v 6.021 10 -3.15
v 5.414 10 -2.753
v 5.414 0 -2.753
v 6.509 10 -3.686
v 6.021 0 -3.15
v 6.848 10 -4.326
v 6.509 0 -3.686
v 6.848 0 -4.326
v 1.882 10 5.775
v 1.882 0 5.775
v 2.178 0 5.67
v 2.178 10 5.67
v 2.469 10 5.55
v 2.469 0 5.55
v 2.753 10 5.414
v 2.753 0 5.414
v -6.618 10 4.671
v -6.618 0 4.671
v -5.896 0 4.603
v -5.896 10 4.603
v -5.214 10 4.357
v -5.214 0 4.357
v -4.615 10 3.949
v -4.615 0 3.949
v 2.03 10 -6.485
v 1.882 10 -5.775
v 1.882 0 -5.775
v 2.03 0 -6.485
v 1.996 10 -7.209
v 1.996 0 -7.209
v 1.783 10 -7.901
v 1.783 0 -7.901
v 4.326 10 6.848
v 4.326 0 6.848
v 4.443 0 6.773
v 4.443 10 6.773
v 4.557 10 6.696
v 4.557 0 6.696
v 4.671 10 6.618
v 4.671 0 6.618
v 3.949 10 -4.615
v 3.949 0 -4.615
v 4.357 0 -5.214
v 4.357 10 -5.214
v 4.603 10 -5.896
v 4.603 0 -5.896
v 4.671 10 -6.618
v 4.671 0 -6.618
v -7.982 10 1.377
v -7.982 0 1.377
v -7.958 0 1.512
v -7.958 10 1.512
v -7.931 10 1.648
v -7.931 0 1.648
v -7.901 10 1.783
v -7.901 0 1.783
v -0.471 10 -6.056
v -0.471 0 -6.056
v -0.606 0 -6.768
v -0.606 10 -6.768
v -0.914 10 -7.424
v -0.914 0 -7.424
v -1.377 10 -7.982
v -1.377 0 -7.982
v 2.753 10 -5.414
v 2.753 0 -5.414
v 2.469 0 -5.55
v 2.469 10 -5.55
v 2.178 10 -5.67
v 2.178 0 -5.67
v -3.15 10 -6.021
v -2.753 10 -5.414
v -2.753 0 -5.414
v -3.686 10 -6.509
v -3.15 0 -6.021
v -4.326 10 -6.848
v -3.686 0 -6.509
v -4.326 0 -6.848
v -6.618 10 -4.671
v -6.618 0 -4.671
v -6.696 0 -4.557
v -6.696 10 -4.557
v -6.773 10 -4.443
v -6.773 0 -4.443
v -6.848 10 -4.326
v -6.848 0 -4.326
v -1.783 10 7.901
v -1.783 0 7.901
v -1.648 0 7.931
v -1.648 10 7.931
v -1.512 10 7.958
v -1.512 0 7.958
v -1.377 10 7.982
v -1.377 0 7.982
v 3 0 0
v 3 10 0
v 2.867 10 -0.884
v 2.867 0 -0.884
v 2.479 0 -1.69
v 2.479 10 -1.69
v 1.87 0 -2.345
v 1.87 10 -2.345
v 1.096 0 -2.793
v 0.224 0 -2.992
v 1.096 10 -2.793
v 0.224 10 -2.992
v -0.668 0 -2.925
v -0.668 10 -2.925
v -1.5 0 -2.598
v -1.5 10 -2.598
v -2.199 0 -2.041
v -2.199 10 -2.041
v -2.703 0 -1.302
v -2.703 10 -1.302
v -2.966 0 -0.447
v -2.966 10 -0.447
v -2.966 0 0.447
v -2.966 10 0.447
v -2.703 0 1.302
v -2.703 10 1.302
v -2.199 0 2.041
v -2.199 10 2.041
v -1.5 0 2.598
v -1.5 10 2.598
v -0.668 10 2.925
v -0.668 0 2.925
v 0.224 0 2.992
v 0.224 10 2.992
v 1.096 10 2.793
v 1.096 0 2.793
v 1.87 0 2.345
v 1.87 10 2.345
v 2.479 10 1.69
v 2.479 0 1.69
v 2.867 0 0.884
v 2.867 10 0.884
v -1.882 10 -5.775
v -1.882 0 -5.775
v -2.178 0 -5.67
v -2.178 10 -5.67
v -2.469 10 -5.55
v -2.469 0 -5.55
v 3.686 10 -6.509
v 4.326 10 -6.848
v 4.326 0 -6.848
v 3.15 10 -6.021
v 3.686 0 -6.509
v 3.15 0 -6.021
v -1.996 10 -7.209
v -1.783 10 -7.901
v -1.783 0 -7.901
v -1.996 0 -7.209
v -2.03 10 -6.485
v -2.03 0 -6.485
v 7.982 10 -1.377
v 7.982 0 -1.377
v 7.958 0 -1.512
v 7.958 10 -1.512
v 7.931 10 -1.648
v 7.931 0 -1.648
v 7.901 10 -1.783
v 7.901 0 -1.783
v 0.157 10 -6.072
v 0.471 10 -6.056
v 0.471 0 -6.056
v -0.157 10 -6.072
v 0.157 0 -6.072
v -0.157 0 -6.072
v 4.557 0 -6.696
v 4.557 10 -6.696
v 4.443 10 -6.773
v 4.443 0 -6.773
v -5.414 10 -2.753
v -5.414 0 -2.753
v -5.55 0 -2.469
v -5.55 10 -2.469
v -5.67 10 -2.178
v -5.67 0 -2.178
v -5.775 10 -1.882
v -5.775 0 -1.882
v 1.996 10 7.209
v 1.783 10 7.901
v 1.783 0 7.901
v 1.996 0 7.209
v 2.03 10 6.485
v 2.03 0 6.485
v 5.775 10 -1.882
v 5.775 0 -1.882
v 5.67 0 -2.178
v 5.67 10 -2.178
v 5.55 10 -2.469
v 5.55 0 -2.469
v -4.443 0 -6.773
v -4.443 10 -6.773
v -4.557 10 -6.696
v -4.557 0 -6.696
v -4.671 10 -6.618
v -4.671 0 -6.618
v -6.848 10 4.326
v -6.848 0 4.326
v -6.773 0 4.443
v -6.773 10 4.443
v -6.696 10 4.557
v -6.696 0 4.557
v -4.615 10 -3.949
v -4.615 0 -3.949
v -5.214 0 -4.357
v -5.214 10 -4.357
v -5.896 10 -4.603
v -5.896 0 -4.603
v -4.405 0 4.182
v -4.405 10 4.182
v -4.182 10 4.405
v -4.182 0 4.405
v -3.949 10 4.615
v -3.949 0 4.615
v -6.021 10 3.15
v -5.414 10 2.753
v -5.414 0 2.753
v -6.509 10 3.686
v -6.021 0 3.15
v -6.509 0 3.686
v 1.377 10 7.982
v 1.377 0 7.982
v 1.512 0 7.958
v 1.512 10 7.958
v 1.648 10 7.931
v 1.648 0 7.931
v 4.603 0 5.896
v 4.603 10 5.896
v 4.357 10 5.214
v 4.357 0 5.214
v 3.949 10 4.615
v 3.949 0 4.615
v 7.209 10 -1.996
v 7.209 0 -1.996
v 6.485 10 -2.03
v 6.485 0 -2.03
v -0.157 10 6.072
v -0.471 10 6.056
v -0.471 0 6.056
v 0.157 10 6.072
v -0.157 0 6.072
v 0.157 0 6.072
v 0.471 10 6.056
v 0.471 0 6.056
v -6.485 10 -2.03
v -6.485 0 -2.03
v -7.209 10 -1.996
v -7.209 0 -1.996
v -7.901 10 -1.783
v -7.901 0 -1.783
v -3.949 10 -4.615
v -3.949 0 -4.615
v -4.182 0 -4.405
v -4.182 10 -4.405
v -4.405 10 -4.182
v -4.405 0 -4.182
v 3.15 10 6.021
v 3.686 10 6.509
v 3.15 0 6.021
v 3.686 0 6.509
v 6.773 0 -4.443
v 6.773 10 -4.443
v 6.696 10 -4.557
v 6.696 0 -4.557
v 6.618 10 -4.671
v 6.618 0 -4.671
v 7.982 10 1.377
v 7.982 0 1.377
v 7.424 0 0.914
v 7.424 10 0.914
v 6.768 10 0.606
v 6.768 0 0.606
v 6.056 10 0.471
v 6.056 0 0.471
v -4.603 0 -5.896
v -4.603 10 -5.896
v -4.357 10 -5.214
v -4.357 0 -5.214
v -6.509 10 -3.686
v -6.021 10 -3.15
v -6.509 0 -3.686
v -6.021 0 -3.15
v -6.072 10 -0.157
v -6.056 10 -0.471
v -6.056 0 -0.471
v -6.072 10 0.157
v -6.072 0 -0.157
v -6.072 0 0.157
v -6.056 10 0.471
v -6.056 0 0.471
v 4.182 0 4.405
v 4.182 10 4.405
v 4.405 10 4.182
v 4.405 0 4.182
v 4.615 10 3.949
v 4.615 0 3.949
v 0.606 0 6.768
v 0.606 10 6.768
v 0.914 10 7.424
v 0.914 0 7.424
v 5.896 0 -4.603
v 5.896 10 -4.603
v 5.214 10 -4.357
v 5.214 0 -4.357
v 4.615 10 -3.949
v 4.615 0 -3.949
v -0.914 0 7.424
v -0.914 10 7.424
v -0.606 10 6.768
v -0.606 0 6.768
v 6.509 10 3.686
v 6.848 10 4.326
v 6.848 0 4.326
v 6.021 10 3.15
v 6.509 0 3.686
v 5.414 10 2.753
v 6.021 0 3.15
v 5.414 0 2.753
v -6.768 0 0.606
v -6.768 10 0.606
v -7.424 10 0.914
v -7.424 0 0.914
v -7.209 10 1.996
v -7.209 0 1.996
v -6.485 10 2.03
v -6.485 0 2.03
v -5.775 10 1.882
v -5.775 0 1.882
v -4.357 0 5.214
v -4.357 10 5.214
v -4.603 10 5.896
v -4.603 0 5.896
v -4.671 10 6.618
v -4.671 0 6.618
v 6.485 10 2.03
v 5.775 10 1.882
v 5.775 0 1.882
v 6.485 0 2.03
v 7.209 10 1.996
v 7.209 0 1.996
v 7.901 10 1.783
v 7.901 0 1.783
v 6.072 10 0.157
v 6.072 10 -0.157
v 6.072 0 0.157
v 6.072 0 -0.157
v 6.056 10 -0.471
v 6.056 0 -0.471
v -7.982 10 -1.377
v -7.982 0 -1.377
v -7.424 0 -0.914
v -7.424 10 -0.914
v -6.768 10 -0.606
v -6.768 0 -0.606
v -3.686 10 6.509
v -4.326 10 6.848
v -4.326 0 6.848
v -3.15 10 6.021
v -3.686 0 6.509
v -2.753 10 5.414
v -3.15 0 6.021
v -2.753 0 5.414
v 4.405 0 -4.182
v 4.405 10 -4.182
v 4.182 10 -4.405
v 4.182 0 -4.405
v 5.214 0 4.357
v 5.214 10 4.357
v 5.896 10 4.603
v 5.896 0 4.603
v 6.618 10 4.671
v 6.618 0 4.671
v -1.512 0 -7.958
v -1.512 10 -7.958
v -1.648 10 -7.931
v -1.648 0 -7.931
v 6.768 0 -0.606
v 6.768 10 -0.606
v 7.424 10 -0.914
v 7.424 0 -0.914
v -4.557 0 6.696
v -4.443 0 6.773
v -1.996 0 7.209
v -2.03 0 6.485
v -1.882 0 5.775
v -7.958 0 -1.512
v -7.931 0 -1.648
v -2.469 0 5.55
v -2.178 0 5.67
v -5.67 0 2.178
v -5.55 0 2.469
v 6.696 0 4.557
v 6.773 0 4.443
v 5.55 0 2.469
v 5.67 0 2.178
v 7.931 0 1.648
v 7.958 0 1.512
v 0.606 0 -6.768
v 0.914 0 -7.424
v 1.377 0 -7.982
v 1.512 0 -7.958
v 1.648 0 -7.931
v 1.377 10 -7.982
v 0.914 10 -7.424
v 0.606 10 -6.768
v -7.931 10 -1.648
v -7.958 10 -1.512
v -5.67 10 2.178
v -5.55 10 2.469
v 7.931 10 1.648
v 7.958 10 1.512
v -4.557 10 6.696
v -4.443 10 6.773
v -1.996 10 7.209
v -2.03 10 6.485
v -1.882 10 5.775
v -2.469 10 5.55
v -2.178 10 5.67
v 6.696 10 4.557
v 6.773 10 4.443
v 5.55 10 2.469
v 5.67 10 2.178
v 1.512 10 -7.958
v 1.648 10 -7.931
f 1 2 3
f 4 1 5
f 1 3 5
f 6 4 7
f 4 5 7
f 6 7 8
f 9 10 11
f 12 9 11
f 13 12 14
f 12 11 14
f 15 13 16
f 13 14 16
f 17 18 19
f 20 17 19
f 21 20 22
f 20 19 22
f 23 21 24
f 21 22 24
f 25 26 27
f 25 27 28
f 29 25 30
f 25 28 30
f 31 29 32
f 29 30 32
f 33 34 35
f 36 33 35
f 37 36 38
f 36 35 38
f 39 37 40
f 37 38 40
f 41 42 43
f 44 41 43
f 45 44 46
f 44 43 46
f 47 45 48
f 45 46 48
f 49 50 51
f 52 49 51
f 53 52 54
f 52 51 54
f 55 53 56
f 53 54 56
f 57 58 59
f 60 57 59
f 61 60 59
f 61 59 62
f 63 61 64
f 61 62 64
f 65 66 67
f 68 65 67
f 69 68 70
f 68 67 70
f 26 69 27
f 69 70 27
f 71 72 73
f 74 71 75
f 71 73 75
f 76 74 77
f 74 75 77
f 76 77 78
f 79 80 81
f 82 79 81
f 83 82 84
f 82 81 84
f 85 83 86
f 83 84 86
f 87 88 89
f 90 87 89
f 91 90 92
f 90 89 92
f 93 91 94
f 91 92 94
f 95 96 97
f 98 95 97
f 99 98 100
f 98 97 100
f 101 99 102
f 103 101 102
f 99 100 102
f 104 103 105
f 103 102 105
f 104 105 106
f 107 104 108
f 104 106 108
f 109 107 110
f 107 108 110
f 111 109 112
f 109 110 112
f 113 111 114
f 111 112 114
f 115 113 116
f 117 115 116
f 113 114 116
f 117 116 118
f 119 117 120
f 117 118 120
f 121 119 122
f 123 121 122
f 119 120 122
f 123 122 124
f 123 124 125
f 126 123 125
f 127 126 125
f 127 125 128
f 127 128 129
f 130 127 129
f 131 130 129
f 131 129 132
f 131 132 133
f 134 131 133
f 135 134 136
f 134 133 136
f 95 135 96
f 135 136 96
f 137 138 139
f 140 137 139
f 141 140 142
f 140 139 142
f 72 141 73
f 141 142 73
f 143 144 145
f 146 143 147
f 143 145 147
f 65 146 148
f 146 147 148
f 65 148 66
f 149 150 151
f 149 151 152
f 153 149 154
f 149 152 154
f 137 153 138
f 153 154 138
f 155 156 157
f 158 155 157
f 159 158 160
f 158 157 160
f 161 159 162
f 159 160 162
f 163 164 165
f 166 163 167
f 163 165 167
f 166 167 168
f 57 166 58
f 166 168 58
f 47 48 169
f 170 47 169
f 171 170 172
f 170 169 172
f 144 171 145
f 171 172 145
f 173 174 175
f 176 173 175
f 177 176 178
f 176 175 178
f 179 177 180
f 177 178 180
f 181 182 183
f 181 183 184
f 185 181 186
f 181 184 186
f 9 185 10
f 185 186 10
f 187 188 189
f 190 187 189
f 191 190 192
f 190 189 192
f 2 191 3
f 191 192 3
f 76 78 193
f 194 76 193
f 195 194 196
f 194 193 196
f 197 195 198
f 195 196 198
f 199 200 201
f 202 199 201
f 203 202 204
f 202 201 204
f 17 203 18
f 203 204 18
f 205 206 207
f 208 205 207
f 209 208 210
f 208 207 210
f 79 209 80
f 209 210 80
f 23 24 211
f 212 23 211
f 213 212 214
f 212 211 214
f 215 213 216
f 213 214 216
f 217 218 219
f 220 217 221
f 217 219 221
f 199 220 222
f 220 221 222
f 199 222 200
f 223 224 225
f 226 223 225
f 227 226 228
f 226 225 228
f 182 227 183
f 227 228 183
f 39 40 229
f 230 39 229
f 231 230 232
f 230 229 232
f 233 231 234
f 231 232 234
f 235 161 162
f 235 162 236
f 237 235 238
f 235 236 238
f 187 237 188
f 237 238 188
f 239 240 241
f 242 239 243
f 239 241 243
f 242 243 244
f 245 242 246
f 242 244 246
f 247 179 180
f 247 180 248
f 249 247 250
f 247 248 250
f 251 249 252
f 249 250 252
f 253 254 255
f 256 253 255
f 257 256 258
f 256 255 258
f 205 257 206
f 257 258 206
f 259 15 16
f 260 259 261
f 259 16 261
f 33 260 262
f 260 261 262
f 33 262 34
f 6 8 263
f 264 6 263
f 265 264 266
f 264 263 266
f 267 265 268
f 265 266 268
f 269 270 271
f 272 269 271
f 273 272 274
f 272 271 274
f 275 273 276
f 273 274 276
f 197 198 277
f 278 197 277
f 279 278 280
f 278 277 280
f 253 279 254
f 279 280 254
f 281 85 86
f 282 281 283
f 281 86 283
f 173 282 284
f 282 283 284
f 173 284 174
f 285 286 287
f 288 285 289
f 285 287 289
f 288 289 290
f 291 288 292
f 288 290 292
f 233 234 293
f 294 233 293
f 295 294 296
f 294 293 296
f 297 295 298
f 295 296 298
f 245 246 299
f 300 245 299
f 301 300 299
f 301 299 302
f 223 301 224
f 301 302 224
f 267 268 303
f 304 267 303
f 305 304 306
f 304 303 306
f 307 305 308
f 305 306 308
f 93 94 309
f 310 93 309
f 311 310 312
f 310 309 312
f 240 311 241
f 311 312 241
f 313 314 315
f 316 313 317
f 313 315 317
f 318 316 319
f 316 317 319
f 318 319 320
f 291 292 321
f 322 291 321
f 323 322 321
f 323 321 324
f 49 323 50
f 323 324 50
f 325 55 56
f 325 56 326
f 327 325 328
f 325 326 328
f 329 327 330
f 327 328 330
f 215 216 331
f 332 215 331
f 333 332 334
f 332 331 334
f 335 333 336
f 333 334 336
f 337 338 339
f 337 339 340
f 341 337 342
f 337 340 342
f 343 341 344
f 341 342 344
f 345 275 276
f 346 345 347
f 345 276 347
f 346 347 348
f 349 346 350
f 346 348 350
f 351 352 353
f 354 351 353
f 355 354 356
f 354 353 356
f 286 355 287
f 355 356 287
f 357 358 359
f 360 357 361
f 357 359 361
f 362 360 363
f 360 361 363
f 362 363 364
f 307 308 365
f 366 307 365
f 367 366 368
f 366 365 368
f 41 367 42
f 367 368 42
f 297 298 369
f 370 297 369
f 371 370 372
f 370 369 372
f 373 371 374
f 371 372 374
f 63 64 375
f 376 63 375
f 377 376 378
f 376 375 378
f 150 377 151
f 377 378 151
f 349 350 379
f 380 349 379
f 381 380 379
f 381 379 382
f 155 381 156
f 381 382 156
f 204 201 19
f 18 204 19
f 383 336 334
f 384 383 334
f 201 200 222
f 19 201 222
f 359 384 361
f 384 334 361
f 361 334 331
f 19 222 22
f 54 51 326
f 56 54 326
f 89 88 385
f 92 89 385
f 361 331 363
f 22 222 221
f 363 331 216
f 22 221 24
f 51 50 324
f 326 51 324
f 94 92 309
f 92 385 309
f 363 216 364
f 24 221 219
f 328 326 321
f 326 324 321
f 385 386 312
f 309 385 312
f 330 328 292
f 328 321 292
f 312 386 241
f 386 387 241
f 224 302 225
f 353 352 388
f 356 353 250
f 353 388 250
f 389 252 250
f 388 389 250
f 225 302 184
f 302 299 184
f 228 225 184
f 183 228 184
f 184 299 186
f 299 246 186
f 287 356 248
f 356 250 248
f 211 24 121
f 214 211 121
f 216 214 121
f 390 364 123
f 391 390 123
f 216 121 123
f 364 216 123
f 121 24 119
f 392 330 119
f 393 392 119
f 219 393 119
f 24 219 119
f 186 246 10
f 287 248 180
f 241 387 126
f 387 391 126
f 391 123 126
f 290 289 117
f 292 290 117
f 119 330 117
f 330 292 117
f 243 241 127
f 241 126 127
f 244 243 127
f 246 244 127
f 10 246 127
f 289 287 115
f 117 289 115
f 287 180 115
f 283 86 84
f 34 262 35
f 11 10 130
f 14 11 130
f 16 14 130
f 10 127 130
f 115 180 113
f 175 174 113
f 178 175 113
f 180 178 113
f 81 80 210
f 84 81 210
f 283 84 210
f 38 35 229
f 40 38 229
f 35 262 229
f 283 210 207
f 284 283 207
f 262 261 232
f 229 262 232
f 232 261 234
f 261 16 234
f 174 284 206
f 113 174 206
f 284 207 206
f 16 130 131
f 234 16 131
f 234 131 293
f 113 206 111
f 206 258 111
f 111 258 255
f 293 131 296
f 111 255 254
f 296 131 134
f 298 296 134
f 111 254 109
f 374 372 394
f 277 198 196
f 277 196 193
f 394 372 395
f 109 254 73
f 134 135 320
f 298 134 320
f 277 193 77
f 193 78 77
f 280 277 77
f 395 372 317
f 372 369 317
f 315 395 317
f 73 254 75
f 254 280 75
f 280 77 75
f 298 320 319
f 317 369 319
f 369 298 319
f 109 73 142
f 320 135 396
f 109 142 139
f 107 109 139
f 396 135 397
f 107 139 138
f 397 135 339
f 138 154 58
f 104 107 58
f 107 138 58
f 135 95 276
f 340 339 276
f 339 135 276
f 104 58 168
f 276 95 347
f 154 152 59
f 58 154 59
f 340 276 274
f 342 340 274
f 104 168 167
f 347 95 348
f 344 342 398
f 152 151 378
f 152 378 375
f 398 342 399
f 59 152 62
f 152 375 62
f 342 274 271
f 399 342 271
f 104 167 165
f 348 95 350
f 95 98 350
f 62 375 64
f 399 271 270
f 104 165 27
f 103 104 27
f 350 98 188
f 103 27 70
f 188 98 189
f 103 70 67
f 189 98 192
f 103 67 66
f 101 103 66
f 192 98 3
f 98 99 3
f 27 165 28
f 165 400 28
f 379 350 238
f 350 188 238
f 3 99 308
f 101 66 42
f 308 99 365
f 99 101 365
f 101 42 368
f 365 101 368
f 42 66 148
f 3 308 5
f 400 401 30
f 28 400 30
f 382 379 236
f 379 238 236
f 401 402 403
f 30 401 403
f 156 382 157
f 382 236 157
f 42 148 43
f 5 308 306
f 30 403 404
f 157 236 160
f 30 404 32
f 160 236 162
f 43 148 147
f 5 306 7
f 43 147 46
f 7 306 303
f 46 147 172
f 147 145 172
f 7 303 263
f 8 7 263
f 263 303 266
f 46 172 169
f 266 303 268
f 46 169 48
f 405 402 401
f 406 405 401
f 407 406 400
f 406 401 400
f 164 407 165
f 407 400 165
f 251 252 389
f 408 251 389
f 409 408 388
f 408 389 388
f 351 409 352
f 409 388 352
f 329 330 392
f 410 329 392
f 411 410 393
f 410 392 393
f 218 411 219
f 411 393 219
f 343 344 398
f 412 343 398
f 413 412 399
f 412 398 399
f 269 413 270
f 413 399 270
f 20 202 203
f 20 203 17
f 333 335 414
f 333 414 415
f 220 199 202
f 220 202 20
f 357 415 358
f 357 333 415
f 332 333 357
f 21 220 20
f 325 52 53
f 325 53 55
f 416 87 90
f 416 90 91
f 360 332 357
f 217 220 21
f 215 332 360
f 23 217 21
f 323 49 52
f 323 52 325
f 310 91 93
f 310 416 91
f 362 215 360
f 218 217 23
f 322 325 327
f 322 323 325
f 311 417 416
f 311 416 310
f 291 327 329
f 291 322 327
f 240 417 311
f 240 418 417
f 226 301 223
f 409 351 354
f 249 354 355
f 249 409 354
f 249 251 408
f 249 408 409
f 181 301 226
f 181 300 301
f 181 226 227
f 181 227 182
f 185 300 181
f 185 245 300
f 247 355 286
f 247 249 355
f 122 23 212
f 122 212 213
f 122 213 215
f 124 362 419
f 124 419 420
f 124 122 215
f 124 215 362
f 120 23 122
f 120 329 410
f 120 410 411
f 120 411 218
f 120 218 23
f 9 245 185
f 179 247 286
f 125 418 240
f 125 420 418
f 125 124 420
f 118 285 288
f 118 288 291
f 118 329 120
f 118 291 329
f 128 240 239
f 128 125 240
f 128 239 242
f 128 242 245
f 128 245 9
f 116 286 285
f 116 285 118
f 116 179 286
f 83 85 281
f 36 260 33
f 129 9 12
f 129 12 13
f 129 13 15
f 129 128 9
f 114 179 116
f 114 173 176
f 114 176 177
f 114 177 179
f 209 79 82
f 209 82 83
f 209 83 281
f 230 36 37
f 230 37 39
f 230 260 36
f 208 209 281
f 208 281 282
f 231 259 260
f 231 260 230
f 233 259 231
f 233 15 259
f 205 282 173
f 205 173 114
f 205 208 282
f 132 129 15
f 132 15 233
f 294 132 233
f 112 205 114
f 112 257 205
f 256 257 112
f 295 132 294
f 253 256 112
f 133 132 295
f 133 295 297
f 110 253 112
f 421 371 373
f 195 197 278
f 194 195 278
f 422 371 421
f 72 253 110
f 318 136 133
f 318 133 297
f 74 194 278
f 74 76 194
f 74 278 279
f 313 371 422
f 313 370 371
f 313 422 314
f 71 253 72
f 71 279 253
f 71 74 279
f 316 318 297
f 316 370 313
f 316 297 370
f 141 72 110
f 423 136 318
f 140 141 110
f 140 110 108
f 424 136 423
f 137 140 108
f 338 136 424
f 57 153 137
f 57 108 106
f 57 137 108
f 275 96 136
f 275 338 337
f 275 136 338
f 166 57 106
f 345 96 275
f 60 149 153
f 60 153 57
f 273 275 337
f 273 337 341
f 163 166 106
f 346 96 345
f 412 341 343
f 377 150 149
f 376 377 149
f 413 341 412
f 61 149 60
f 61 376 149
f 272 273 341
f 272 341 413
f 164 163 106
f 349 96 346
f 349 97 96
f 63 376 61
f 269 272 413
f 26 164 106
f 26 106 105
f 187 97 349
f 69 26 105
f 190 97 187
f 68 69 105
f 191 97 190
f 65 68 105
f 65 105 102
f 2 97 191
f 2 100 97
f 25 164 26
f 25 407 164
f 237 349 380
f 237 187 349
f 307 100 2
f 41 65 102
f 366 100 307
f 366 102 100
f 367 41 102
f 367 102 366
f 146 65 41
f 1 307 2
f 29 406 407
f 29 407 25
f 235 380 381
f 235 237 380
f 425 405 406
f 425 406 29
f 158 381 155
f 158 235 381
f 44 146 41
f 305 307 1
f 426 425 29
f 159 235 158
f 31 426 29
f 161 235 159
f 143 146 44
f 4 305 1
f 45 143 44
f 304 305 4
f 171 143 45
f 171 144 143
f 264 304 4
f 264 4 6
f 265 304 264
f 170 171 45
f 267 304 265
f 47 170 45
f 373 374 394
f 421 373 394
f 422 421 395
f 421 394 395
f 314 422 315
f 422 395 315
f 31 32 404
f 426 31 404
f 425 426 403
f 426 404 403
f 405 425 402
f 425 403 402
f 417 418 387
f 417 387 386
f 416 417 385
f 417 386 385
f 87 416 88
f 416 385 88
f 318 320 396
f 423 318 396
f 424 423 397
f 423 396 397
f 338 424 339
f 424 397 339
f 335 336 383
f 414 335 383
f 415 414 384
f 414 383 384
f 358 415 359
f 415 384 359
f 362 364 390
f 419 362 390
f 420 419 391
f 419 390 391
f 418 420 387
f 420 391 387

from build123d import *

# Parameters (mm, degrees)
BOSS_EXTRUDE1_DEPTH = 10
SKETCH2_R           = 3
CUT_EXTRUDE1_DEPTH  = 10


with BuildPart() as part:
    # Sketch1 → Boss-Extrude1 (new body)
    with BuildSketch(Plane(origin=(0, 0, 0), x_dir=(1, 0, 0), z_dir=(0, 1, 0))):
        with BuildLine():
            ThreePointArc((-7.982172642, 1.3765609), (-7.105660658, 0.739320543), (-6.05570223, 0.47111199))
            ThreePointArc((-6.05570223, 0.47111199), (-6.074, 0), (-6.05570223, -0.47111199))
            ThreePointArc((-6.05570223, -0.47111199), (-7.105660658, -0.739320543), (-7.982172642, -1.3765609))
            ThreePointArc((-7.982172642, -1.3765609), (-7.944360771, -1.580231608), (-7.901352979, -1.782868784))
            ThreePointArc((-7.901352979, -1.782868784), (-6.84770017, -2.036175492), (-5.775026098, -1.882166189))
            ThreePointArc((-5.775026098, -1.882166189), (-5.61164428, -2.324419168), (-5.414452591, -2.75266764))
            ThreePointArc((-5.414452591, -2.75266764), (-6.281848724, -3.402261728), (-6.847778879, -4.326421665))
            ThreePointArc((-6.847778879, -4.326421665), (-6.73490386, -4.500118887), (-6.617623951, -4.670872857))
            ThreePointArc((-6.617623951, -4.670872857), (-5.547239406, -4.501682267), (-4.615154594, -3.948901628))
            ThreePointArc((-4.615154594, -3.948901628), (-4.294966589, -4.294966589), (-3.948901628, -4.615154594))
            ThreePointArc((-3.948901628, -4.615154594), (-4.501682267, -5.547239406), (-4.670872857, -6.617623951))
            ThreePointArc((-4.670872857, -6.617623951), (-4.500118887, -6.73490386), (-4.326421665, -6.847778879))
            ThreePointArc((-4.326421665, -6.847778879), (-3.402261728, -6.281848724), (-2.75266764, -5.414452591))
            ThreePointArc((-2.75266764, -5.414452591), (-2.324419168, -5.61164428), (-1.882166189, -5.775026098))
            ThreePointArc((-1.882166189, -5.775026098), (-2.036175492, -6.84770017), (-1.782868784, -7.901352979))
            ThreePointArc((-1.782868784, -7.901352979), (-1.580231608, -7.944360771), (-1.3765609, -7.982172642))
            ThreePointArc((-1.3765609, -7.982172642), (-0.739320543, -7.105660658), (-0.47111199, -6.05570223))
            ThreePointArc((-0.47111199, -6.05570223), (0, -6.074), (0.47111199, -6.05570223))
            ThreePointArc((0.47111199, -6.05570223), (0.739320543, -7.105660658), (1.3765609, -7.982172642))
            ThreePointArc((1.3765609, -7.982172642), (1.580231608, -7.944360771), (1.782868784, -7.901352979))
            ThreePointArc((1.782868784, -7.901352979), (2.036175492, -6.84770017), (1.882166189, -5.775026098))
            ThreePointArc((1.882166189, -5.775026098), (2.324419168, -5.61164428), (2.75266764, -5.414452591))
            ThreePointArc((2.75266764, -5.414452591), (3.402261728, -6.281848724), (4.326421665, -6.847778879))
            ThreePointArc((4.326421665, -6.847778879), (4.500118887, -6.73490386), (4.670872857, -6.617623951))
            ThreePointArc((4.670872857, -6.617623951), (4.501682267, -5.547239406), (3.948901628, -4.615154594))
            ThreePointArc((3.948901628, -4.615154594), (4.294966589, -4.294966589), (4.615154594, -3.948901628))
            ThreePointArc((4.615154594, -3.948901628), (5.547239406, -4.501682267), (6.617623951, -4.670872857))
            ThreePointArc((6.617623951, -4.670872857), (6.73490386, -4.500118887), (6.847778879, -4.326421665))
            ThreePointArc((6.847778879, -4.326421665), (6.281848724, -3.402261728), (5.414452591, -2.75266764))
            ThreePointArc((5.414452591, -2.75266764), (5.61164428, -2.324419168), (5.775026098, -1.882166189))
            ThreePointArc((5.775026098, -1.882166189), (6.84770017, -2.036175492), (7.901352979, -1.782868784))
            ThreePointArc((7.901352979, -1.782868784), (7.944360771, -1.580231608), (7.982172642, -1.3765609))
            ThreePointArc((7.982172642, -1.3765609), (7.105660658, -0.739320543), (6.05570223, -0.47111199))
            ThreePointArc((6.05570223, -0.47111199), (6.074, 0), (6.05570223, 0.47111199))
            ThreePointArc((6.05570223, 0.47111199), (7.105660658, 0.739320543), (7.982172642, 1.3765609))
            ThreePointArc((7.982172642, 1.3765609), (7.944360771, 1.580231608), (7.901352979, 1.782868784))
            ThreePointArc((7.901352979, 1.782868784), (6.84770017, 2.036175492), (5.775026098, 1.882166189))
            ThreePointArc((5.775026098, 1.882166189), (5.61164428, 2.324419168), (5.414452591, 2.75266764))
            ThreePointArc((5.414452591, 2.75266764), (6.281848724, 3.402261728), (6.847778879, 4.326421665))
            ThreePointArc((6.847778879, 4.326421665), (6.73490386, 4.500118887), (6.617623951, 4.670872857))
            ThreePointArc((6.617623951, 4.670872857), (5.547239406, 4.501682267), (4.615154594, 3.948901628))
            ThreePointArc((4.615154594, 3.948901628), (4.294966589, 4.294966589), (3.948901628, 4.615154594))
            ThreePointArc((3.948901628, 4.615154594), (4.501682267, 5.547239406), (4.670872857, 6.617623951))
            ThreePointArc((4.670872857, 6.617623951), (4.500118887, 6.73490386), (4.326421665, 6.847778879))
            ThreePointArc((4.326421665, 6.847778879), (3.402261728, 6.281848724), (2.75266764, 5.414452591))
            ThreePointArc((2.75266764, 5.414452591), (2.324419168, 5.61164428), (1.882166189, 5.775026098))
            ThreePointArc((1.882166189, 5.775026098), (2.036175492, 6.84770017), (1.782868784, 7.901352979))
            ThreePointArc((1.782868784, 7.901352979), (1.580231608, 7.944360771), (1.3765609, 7.982172642))
            ThreePointArc((1.3765609, 7.982172642), (0.739320543, 7.105660658), (0.47111199, 6.05570223))
            ThreePointArc((0.47111199, 6.05570223), (0, 6.074), (-0.47111199, 6.05570223))
            ThreePointArc((-0.47111199, 6.05570223), (-0.739320543, 7.105660658), (-1.3765609, 7.982172642))
            ThreePointArc((-1.3765609, 7.982172642), (-1.580231608, 7.944360771), (-1.782868784, 7.901352979))
            ThreePointArc((-1.782868784, 7.901352979), (-2.036175492, 6.84770017), (-1.882166189, 5.775026098))
            ThreePointArc((-1.882166189, 5.775026098), (-2.324419168, 5.61164428), (-2.75266764, 5.414452591))
            ThreePointArc((-2.75266764, 5.414452591), (-3.402261728, 6.281848724), (-4.326421665, 6.847778879))
            ThreePointArc((-4.326421665, 6.847778879), (-4.500118887, 6.73490386), (-4.670872857, 6.617623951))
            ThreePointArc((-4.670872857, 6.617623951), (-4.501682267, 5.547239406), (-3.948901628, 4.615154594))
            ThreePointArc((-3.948901628, 4.615154594), (-4.294966589, 4.294966589), (-4.615154594, 3.948901628))
            ThreePointArc((-4.615154594, 3.948901628), (-5.547239406, 4.501682267), (-6.617623951, 4.670872857))
            ThreePointArc((-6.617623951, 4.670872857), (-6.73490386, 4.500118887), (-6.847778879, 4.326421665))
            ThreePointArc((-6.847778879, 4.326421665), (-6.281848724, 3.402261728), (-5.414452591, 2.75266764))
            ThreePointArc((-5.414452591, 2.75266764), (-5.61164428, 2.324419168), (-5.775026098, 1.882166189))
            ThreePointArc((-5.775026098, 1.882166189), (-6.84770017, 2.036175492), (-7.901352979, 1.782868784))
            ThreePointArc((-7.901352979, 1.782868784), (-7.944360771, 1.580231608), (-7.982172642, 1.3765609))
        make_face()
    extrude(amount=BOSS_EXTRUDE1_DEPTH)

    # Sketch2 → Cut-Extrude1 (cut)
    with BuildSketch(Plane(origin=(0, 10, 0), x_dir=(1, 0, 0), z_dir=(0, 1, 0))):
        Circle(SKETCH2_R)
    extrude(amount=-CUT_EXTRUDE1_DEPTH, mode=Mode.SUBTRACT)


solid = part.part
